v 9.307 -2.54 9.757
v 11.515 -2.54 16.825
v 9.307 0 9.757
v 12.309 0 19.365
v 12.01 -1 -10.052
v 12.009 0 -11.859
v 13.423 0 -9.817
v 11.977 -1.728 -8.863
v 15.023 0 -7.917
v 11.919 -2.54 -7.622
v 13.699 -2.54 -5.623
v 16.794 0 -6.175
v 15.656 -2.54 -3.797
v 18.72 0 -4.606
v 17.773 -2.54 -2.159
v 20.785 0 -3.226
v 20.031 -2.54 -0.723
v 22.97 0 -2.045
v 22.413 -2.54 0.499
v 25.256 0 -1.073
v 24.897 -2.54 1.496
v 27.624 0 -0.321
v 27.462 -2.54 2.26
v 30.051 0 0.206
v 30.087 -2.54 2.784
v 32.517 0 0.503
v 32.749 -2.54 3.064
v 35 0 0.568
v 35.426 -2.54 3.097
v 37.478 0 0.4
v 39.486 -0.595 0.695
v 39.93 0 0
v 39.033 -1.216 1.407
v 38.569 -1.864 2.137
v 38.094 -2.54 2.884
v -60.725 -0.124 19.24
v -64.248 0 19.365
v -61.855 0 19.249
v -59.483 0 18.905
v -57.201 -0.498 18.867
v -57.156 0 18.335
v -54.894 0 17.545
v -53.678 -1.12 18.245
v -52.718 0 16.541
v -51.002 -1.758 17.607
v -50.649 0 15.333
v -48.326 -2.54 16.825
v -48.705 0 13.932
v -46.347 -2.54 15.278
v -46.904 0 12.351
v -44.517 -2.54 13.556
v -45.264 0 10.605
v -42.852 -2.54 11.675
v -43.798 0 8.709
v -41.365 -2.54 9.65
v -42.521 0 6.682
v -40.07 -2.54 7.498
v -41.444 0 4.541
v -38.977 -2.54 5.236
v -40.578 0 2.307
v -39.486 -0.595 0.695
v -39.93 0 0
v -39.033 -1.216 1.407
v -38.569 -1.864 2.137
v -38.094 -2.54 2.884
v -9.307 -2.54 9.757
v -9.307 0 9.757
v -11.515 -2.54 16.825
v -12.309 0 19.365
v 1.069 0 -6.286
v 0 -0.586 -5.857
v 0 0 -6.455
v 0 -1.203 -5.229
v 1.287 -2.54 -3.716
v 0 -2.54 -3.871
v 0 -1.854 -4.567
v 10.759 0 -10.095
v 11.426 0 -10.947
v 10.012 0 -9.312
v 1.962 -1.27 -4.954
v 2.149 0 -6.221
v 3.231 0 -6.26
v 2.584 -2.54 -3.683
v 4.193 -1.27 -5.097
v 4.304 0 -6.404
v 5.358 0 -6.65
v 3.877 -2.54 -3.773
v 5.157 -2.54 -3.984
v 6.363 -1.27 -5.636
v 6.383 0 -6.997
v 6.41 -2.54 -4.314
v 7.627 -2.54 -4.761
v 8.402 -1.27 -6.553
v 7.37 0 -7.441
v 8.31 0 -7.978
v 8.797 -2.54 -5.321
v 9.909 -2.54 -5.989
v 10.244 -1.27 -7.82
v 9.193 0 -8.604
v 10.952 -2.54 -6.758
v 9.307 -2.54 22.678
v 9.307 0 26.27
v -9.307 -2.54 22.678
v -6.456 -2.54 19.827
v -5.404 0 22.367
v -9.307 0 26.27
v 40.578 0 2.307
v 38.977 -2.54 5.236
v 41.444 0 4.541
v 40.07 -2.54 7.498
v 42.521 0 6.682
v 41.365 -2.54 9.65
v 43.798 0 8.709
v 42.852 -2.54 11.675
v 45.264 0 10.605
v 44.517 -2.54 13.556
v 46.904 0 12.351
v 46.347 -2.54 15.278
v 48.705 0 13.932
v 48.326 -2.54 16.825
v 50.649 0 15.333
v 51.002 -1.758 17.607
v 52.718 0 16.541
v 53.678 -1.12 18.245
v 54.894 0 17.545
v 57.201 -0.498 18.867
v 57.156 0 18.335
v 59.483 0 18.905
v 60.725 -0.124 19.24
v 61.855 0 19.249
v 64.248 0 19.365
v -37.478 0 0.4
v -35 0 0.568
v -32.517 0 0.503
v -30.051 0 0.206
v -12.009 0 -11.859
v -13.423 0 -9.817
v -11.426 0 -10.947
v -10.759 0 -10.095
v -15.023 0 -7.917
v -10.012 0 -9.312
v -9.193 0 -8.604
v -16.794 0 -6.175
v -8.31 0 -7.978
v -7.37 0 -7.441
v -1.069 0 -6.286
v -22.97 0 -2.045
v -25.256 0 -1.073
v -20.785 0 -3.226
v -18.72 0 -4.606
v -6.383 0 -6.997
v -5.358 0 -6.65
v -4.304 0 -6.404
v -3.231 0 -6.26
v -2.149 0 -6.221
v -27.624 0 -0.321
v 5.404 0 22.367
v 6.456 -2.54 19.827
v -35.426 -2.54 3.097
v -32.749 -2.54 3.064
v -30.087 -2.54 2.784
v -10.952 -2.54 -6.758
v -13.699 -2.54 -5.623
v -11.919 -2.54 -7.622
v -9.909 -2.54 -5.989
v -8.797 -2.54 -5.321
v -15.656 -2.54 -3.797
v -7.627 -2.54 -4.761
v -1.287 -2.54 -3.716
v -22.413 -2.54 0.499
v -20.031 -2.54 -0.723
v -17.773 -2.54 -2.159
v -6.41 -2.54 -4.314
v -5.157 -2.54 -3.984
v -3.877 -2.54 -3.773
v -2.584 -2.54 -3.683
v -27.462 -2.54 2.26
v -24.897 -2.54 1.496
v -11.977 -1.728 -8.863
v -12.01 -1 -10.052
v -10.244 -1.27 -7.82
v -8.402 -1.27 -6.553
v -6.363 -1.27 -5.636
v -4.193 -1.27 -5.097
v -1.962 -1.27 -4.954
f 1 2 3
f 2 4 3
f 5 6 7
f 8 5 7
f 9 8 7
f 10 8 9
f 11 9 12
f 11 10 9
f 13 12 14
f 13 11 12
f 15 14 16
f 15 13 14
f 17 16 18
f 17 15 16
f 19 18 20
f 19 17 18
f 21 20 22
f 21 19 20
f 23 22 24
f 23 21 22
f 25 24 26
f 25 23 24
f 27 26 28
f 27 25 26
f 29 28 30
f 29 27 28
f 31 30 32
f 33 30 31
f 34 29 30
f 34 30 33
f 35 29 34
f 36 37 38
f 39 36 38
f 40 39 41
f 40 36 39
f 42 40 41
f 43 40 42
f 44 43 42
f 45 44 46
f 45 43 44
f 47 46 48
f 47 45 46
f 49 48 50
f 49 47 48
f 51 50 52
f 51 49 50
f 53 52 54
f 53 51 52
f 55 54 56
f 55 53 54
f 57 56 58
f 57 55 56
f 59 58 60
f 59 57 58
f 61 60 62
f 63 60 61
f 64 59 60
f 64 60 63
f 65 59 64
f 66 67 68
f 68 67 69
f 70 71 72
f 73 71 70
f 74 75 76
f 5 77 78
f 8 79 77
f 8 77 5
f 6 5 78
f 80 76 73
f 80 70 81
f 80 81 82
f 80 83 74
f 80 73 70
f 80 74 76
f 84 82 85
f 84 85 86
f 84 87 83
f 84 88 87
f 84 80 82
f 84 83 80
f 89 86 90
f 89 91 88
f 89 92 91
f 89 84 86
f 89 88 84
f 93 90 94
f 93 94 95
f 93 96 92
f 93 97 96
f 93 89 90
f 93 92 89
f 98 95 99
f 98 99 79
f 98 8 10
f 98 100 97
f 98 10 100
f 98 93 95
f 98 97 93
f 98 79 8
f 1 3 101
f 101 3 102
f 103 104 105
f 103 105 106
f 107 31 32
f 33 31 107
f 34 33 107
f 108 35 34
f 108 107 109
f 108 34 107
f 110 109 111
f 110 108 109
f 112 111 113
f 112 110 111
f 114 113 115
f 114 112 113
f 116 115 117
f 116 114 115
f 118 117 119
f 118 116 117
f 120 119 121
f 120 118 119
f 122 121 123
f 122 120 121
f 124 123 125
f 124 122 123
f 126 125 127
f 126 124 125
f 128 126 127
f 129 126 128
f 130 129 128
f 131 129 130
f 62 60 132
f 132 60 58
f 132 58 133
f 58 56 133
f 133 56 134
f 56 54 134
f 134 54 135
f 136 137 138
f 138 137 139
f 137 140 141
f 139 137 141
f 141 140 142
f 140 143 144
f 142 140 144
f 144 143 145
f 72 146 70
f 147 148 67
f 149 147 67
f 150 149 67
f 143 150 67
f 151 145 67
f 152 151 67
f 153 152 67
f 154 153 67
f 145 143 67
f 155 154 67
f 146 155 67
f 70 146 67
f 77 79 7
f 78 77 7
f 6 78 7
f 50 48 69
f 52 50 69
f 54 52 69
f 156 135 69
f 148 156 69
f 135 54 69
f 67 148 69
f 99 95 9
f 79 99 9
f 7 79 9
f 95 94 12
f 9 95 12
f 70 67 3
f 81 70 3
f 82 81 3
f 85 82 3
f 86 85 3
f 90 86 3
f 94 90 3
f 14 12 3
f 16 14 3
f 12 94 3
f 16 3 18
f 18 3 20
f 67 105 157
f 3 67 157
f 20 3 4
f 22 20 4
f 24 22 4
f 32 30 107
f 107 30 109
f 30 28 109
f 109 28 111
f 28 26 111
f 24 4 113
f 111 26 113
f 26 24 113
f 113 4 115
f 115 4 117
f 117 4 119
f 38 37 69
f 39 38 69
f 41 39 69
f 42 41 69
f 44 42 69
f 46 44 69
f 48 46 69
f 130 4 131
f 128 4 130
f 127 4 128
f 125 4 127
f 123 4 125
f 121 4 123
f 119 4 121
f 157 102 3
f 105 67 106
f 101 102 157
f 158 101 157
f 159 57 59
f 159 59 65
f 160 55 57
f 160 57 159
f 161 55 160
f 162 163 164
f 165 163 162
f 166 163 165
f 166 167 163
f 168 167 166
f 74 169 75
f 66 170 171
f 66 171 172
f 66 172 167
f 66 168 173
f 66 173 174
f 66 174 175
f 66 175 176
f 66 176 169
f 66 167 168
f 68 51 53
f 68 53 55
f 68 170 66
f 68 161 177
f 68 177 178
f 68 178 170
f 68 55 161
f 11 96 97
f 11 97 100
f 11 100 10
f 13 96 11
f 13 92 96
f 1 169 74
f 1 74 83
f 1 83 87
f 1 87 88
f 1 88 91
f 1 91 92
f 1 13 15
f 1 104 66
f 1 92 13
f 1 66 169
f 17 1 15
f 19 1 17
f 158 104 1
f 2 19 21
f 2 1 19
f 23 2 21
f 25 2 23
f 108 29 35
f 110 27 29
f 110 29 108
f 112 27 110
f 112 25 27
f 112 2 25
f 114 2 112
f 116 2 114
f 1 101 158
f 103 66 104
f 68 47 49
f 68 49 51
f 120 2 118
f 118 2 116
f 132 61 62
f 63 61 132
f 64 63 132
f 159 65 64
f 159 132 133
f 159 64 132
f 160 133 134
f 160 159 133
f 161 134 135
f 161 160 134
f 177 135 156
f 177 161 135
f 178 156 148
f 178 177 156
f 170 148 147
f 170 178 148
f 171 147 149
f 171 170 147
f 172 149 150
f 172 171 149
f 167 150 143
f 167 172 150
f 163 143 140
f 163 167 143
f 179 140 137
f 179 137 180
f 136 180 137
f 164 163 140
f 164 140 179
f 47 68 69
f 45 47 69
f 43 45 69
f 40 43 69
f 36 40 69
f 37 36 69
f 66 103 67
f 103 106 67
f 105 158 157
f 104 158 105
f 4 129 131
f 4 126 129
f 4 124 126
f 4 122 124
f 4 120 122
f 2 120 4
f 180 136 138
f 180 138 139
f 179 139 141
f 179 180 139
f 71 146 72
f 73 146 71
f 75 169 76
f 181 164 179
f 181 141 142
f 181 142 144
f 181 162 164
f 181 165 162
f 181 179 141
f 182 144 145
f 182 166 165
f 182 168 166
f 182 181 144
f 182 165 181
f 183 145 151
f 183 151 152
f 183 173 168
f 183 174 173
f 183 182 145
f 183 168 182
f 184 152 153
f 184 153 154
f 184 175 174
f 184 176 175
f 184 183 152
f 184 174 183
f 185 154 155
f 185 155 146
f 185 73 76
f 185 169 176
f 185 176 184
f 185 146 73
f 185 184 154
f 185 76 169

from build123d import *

# Parameters (mm, degrees)
F1_DEPTH = 2.54
F2_SIZE  = 2.53999


# Not quite as in the source:
# - a fillet or chamfer is up to 0.001 mm smaller than in the source, because OpenCascade refuses the exact size


with BuildPart() as f1:
    # F0 (on Front) → F1 (new body)
    with BuildSketch(Plane.XZ):
        with BuildLine():
            Line((-12.3092299327, 19.36452277), (-64.2481818795, 19.36452277))
            ThreePointArc((-64.2481818795, 19.36452277), (-48.7050050326, 13.9320089842), (-39.9299450219, 0))
            ThreePointArc((-39.9299450219, 0), (-24.1018123493, -1.5321631259), (-12.0090059936, -11.8588926271))
            ThreePointArc((-12.0090059936, -11.8588926271), (-6.881876251, -7.2071480524), (0, -6.4548407681))
            ThreePointArc((0, -6.4548407681), (6.881876251, -7.2071480524), (12.0090059936, -11.8588926271))
            ThreePointArc((12.0090059936, -11.8588926271), (24.1018123493, -1.5321631259), (39.9299450219, 0))
            ThreePointArc((39.9299450219, 0), (48.7050050326, 13.9320089842), (64.2481818795, 19.36452277))
            Line((64.2481818795, 19.36452277), (12.3092299327, 19.36452277))
            Line((12.3092299327, 19.36452277), (9.3069793656, 9.7573176026))
            Line((9.3069793656, 9.7573176026), (9.3069793656, 26.2697003782))
            Line((9.3069793656, 26.2697003782), (5.4040518589, 22.3667733371))
            Line((5.4040518589, 22.3667733371), (0, 22.3667733371))
            Line((0, 22.3667733371), (-5.4040518589, 22.3667733371))
            Line((-5.4040518589, 22.3667733371), (-9.3069793656, 26.2697003782))
            Line((-9.3069793656, 26.2697003782), (-9.3069793656, 9.7573176026))
            Line((-9.3069793656, 9.7573176026), (-12.3092299327, 19.36452277))
        make_face()
    extrude(amount=F1_DEPTH)

    # F2 (size 2.54 in the source; OpenCascade refuses exactly that, so slightly less here)
    f2_edges = [f1.edges().sort_by_distance(p)[0] for p in [
        (-38.278706, -2.54, 19.364523),
        (38.278706, -2.54, 19.364523),
        (48.705005, -2.54, 13.932009),
        (24.101812, -2.54, -1.532163),
        (6.881876, -2.54, -7.207148),
        (-6.881876, -2.54, -7.207148),
        (-24.101812, -2.54, -1.532163),
        (-48.705005, -2.54, 13.932009),
        (-7.355516, -2.54, 24.318237),
        (0, -2.54, 22.366773),
        (7.355516, -2.54, 24.318237),
    ]]
    chamfer(f2_edges, length=F2_SIZE)


solid = f1.part
